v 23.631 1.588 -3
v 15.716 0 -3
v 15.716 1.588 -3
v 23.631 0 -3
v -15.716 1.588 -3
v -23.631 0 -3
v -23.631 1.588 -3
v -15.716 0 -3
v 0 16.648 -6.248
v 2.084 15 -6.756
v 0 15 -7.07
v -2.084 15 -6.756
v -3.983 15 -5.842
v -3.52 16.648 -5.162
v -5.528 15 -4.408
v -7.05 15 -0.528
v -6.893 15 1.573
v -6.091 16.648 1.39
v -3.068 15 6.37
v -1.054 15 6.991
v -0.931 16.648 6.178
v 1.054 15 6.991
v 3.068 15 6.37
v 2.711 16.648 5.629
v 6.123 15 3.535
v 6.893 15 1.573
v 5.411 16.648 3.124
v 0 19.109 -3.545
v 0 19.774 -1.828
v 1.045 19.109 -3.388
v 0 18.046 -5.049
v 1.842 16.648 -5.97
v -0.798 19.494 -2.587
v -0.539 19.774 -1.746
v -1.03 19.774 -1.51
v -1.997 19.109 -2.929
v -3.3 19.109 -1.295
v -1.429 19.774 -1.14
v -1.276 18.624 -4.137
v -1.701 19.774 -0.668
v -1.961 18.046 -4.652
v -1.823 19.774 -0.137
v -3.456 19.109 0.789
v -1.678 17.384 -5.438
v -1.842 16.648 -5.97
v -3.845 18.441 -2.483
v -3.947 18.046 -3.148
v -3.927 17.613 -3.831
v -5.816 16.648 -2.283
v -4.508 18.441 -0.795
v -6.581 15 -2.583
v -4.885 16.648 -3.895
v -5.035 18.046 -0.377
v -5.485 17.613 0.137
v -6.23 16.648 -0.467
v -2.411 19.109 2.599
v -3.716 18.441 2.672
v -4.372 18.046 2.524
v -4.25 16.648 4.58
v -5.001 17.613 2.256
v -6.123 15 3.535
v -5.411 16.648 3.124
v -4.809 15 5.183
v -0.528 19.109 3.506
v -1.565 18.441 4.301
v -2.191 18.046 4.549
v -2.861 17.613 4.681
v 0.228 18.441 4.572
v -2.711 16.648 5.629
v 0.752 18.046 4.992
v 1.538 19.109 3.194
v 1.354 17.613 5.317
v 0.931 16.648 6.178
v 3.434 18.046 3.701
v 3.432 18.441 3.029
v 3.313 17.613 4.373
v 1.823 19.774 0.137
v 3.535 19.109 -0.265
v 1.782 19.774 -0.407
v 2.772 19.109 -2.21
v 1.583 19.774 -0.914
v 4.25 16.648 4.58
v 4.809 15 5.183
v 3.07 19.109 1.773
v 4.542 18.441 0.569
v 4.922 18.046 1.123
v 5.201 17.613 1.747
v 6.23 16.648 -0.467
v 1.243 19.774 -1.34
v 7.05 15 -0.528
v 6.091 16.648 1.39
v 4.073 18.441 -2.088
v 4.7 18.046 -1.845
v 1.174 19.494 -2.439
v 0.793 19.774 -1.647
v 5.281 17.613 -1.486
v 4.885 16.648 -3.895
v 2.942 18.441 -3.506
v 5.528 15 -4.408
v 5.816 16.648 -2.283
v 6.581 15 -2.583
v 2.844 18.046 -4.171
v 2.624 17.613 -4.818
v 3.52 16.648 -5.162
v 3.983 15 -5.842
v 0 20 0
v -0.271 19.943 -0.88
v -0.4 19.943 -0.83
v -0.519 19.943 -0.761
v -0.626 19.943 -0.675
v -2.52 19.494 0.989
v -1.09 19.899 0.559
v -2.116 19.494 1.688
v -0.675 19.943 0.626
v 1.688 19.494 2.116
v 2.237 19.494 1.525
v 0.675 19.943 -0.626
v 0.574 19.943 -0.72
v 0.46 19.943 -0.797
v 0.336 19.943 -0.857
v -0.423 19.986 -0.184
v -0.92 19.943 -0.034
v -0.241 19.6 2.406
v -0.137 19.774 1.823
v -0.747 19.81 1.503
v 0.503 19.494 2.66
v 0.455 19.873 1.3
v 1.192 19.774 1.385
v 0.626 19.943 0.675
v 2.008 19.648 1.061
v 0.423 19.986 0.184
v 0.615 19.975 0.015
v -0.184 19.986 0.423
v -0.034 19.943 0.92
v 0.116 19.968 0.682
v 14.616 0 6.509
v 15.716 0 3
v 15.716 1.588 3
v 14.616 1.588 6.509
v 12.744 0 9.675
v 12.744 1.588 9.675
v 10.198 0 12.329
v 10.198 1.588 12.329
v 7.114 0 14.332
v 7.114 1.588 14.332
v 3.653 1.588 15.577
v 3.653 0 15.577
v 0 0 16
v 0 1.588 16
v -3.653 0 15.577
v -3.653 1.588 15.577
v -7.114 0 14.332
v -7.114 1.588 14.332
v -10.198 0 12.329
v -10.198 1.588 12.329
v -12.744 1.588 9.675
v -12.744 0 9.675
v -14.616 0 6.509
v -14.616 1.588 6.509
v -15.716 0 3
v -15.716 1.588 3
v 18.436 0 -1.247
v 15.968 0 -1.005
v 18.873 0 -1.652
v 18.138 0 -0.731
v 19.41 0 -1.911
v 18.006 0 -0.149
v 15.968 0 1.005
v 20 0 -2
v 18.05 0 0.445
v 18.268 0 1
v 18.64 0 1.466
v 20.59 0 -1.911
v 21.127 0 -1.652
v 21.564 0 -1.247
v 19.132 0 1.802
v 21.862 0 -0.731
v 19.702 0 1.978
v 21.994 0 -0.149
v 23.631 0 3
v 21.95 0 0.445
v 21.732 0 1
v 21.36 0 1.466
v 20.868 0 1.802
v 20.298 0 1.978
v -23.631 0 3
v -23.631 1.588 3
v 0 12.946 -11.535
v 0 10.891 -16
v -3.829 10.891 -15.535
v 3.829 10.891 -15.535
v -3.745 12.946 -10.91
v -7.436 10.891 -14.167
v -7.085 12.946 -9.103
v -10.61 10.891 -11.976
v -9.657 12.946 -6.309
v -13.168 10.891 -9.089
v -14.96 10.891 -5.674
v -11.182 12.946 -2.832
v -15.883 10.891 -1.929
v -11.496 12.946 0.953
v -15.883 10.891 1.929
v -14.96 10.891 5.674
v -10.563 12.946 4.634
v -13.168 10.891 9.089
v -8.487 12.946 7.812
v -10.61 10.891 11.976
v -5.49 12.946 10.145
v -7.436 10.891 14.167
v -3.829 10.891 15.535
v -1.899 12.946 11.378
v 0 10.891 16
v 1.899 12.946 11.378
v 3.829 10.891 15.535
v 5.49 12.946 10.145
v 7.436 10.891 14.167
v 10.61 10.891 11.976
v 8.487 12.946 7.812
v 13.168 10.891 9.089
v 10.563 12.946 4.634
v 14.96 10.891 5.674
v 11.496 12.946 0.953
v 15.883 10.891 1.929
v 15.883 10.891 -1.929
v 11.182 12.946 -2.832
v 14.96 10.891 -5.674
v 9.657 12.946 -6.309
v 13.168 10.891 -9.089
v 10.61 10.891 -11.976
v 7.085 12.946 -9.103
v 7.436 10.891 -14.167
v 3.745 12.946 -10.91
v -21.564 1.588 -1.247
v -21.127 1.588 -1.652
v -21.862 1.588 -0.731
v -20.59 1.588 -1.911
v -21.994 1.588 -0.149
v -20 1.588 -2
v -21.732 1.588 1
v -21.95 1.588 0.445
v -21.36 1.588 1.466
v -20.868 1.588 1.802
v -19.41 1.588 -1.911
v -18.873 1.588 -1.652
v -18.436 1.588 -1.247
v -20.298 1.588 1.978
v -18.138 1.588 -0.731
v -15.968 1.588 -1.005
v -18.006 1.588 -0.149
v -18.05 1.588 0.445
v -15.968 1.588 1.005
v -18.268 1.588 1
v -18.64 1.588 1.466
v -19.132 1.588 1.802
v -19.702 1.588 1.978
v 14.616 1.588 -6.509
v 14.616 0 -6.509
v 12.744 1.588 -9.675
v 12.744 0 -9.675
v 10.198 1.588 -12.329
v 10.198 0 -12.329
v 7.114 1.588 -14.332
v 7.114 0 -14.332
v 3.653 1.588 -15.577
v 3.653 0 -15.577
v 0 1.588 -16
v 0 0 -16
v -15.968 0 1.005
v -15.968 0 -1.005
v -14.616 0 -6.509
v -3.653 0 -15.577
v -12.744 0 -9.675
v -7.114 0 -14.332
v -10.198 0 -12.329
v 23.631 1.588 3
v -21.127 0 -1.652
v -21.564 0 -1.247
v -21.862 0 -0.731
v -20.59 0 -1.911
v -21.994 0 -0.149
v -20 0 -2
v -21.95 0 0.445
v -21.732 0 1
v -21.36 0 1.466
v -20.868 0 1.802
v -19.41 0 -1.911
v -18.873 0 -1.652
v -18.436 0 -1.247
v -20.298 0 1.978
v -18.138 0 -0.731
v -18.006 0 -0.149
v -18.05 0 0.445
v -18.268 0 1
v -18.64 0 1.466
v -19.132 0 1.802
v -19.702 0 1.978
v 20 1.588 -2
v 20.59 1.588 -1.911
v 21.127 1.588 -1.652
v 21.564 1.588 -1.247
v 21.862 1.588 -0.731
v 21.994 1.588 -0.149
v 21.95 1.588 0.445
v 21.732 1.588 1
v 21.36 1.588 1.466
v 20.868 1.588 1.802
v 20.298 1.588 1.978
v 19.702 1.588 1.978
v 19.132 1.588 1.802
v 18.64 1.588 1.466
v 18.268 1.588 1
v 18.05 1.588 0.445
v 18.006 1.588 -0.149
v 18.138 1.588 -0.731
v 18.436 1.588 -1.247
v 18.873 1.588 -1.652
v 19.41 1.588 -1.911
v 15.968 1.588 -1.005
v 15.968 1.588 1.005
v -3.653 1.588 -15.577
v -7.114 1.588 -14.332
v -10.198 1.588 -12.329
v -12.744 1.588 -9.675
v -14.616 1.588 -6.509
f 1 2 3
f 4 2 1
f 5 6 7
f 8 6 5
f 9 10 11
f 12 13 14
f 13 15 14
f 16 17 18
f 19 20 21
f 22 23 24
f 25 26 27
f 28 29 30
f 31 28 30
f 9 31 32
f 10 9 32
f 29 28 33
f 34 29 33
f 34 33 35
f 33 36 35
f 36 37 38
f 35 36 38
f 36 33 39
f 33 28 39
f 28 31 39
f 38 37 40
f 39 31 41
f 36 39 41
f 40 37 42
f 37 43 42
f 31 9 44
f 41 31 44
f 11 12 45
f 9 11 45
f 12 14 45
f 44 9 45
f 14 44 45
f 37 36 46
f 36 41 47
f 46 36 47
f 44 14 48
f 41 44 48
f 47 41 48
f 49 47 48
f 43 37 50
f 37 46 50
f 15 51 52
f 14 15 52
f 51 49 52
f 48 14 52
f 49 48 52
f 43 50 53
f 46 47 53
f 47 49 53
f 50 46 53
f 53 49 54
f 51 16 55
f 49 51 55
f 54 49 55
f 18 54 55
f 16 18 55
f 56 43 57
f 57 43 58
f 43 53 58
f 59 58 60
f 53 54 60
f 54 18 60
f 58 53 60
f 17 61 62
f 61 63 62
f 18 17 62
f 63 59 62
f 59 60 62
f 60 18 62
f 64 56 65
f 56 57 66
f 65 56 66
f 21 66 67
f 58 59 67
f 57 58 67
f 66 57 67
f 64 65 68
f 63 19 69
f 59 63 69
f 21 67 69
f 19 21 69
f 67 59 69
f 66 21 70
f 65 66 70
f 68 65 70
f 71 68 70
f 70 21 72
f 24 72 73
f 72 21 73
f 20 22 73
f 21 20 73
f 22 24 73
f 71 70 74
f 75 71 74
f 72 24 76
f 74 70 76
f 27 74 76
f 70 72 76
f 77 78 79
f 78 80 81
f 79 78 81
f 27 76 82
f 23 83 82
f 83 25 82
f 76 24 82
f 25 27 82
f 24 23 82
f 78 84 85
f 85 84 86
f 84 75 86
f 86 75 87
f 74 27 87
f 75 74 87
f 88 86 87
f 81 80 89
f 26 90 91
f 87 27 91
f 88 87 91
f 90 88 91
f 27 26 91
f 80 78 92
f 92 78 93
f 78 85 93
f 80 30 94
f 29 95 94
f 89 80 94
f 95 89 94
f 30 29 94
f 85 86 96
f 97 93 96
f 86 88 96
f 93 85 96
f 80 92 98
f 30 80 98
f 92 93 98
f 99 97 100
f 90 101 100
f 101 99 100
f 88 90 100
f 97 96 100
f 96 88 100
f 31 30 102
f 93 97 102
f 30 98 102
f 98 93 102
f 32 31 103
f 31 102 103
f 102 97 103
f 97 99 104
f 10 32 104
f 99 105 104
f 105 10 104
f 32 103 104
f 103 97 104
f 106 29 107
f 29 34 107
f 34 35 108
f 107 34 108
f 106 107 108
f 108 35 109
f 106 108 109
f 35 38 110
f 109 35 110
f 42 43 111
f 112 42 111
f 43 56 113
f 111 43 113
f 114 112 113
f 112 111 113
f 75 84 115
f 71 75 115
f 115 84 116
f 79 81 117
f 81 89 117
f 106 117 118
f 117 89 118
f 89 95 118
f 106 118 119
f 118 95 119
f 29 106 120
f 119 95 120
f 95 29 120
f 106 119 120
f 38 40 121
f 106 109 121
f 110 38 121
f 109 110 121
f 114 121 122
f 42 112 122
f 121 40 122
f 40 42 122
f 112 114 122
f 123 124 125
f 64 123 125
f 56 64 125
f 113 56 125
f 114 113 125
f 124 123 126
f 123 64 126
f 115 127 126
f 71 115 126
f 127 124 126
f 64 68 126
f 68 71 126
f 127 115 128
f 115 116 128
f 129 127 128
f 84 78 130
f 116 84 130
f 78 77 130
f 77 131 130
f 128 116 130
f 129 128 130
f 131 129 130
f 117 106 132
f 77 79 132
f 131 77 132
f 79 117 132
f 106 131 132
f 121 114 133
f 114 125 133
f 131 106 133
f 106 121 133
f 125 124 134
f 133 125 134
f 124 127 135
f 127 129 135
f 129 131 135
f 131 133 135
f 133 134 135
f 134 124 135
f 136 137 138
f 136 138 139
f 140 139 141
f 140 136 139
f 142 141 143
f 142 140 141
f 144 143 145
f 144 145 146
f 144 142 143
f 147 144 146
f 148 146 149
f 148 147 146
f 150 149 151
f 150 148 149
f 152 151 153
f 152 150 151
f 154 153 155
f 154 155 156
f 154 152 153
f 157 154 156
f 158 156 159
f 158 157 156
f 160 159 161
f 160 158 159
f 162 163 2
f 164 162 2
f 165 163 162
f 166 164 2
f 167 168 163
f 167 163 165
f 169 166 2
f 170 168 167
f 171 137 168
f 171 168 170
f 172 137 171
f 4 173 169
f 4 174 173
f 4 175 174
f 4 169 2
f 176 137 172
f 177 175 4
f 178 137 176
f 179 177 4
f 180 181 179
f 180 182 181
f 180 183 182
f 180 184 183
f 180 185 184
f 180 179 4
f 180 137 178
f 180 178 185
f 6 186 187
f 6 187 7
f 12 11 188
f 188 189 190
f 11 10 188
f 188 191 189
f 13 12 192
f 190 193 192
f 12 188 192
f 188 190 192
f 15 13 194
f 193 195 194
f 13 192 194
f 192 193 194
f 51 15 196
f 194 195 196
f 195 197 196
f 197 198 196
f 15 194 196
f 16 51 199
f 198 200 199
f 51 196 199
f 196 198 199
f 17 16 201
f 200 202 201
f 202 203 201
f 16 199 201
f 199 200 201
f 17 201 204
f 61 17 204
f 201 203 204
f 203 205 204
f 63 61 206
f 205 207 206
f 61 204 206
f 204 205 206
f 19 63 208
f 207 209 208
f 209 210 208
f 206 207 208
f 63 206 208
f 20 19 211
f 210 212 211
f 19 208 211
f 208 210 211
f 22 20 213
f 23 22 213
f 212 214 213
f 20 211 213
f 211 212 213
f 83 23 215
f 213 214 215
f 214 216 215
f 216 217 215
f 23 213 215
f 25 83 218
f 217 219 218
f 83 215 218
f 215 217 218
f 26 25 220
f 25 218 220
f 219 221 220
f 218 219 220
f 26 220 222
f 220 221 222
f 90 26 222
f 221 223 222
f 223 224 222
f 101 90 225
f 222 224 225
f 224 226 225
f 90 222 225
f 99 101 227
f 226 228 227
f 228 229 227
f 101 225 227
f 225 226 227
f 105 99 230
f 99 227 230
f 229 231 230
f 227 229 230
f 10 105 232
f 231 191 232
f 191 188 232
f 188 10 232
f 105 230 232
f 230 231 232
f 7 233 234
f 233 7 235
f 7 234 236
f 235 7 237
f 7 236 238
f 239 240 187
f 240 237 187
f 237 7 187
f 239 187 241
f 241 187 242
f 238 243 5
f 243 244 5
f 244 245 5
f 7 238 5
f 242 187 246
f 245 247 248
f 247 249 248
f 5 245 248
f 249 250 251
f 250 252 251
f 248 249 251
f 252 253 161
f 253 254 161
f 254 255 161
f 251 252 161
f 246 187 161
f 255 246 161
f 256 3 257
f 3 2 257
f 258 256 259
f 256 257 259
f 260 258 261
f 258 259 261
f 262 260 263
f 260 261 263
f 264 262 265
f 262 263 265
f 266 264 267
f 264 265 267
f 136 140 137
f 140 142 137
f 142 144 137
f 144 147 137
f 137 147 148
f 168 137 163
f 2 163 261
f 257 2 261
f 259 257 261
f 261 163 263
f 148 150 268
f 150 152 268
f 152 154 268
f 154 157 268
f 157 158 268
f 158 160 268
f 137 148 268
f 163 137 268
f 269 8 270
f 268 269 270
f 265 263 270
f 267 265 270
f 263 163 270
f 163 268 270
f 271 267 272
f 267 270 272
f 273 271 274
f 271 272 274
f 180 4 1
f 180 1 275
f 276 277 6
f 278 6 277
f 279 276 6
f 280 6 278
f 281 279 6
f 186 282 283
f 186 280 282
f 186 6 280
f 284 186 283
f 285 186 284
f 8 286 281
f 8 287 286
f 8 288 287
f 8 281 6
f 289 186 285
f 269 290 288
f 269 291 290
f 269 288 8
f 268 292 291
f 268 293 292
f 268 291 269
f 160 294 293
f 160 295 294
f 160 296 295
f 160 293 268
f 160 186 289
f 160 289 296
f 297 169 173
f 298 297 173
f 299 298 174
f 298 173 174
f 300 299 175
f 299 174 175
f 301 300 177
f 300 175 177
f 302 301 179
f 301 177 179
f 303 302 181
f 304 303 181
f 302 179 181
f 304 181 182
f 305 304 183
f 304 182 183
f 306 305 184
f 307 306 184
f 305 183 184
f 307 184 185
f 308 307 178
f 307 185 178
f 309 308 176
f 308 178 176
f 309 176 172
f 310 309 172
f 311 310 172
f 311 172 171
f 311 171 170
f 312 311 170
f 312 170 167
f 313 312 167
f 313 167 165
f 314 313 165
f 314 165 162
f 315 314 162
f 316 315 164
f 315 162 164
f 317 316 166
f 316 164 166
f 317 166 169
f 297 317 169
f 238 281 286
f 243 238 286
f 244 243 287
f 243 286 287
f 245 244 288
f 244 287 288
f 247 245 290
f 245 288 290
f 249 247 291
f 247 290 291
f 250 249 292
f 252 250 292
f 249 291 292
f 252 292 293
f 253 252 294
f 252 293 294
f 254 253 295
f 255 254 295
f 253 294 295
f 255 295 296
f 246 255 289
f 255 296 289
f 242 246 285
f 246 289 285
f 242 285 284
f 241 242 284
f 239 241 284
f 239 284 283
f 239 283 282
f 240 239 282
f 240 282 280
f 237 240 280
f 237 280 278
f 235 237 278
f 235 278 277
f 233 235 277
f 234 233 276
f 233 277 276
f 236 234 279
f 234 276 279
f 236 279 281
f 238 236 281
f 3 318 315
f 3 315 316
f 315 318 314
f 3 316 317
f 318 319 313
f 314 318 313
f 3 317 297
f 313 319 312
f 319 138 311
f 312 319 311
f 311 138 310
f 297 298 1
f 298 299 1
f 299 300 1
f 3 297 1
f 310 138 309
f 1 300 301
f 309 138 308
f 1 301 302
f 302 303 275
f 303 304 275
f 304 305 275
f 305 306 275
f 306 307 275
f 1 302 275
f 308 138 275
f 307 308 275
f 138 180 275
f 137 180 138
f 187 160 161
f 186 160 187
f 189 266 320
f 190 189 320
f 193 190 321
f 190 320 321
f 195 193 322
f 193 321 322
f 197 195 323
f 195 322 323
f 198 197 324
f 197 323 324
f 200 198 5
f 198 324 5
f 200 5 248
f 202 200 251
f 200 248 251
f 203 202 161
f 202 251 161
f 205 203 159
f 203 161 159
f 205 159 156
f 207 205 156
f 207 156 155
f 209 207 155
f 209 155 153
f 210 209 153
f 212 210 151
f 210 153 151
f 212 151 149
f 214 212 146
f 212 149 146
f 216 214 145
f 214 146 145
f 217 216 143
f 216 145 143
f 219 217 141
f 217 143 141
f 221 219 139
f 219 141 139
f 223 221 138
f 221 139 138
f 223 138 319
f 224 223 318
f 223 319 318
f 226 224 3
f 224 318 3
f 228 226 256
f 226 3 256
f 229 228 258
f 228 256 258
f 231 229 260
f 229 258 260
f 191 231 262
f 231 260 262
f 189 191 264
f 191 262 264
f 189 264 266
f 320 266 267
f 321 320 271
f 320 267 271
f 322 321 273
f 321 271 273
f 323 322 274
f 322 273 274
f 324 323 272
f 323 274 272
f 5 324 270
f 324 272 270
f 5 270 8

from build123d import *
from build123d.topology import SkipClean

# Parameters (mm, degrees)
SKETCH5_R           = 2
BOSS_EXTRUDE1_DEPTH = 1.5875


with BuildPart() as part:
    # Sketch1 → Revolve2 (revolve)
    with BuildSketch(Plane.XY, mode=Mode.PRIVATE) as revolve2_sk:
        with BuildLine():
            ThreePointArc((0, 20), (4.32968577, 18.623685679), (7.07, 15))
            Line((7.07, 15), (16, 10.891346557))
            Line((16, 10.891346557), (16, 0))
            Line((16, 0), (0, 0))
            Line((0, 0), (0, 20))
        make_face()
    revolve(revolve2_sk.sketch.rotate(Axis((0, 0, 0), (0, 1, 0)), 90), axis=Axis((0, 0, 0), (0, 1, 0)))

    # Sketch5 → Boss-Extrude1 (add)
    with SkipClean():  # the faces are left unmerged after this step: merging them gives an invalid solid
        with BuildSketch(Plane.XZ):
            with BuildLine():
                Line((23.630800275, 0), (23.630800275, 3))
                Line((23.630800275, 3), (15.716233646, 3))
                ThreePointArc((15.716233646, 3), (0, 16), (-15.716233646, 3))
                Line((-15.716233646, 3), (-23.630800275, 3))
                Line((-23.630800275, 3), (-23.630800275, 0))
                Line((-23.630800275, 0), (-23.630800275, -3))
                Line((-23.630800275, -3), (-15.716233646, -3))
                ThreePointArc((-15.716233646, -3), (0, -16), (15.716233646, -3))
                Line((15.716233646, -3), (23.630800275, -3))
                Line((23.630800275, -3), (23.630800275, 0))
            make_face()
            with Locations(Location((-20, 0, 0), (0, 0, 270))):
                Circle(SKETCH5_R, mode=Mode.SUBTRACT)
            with Locations(Location((20, 0, 0), (0, 0, 270))):
                Circle(SKETCH5_R, mode=Mode.SUBTRACT)
        extrude(amount=-BOSS_EXTRUDE1_DEPTH)


solid = part.part
